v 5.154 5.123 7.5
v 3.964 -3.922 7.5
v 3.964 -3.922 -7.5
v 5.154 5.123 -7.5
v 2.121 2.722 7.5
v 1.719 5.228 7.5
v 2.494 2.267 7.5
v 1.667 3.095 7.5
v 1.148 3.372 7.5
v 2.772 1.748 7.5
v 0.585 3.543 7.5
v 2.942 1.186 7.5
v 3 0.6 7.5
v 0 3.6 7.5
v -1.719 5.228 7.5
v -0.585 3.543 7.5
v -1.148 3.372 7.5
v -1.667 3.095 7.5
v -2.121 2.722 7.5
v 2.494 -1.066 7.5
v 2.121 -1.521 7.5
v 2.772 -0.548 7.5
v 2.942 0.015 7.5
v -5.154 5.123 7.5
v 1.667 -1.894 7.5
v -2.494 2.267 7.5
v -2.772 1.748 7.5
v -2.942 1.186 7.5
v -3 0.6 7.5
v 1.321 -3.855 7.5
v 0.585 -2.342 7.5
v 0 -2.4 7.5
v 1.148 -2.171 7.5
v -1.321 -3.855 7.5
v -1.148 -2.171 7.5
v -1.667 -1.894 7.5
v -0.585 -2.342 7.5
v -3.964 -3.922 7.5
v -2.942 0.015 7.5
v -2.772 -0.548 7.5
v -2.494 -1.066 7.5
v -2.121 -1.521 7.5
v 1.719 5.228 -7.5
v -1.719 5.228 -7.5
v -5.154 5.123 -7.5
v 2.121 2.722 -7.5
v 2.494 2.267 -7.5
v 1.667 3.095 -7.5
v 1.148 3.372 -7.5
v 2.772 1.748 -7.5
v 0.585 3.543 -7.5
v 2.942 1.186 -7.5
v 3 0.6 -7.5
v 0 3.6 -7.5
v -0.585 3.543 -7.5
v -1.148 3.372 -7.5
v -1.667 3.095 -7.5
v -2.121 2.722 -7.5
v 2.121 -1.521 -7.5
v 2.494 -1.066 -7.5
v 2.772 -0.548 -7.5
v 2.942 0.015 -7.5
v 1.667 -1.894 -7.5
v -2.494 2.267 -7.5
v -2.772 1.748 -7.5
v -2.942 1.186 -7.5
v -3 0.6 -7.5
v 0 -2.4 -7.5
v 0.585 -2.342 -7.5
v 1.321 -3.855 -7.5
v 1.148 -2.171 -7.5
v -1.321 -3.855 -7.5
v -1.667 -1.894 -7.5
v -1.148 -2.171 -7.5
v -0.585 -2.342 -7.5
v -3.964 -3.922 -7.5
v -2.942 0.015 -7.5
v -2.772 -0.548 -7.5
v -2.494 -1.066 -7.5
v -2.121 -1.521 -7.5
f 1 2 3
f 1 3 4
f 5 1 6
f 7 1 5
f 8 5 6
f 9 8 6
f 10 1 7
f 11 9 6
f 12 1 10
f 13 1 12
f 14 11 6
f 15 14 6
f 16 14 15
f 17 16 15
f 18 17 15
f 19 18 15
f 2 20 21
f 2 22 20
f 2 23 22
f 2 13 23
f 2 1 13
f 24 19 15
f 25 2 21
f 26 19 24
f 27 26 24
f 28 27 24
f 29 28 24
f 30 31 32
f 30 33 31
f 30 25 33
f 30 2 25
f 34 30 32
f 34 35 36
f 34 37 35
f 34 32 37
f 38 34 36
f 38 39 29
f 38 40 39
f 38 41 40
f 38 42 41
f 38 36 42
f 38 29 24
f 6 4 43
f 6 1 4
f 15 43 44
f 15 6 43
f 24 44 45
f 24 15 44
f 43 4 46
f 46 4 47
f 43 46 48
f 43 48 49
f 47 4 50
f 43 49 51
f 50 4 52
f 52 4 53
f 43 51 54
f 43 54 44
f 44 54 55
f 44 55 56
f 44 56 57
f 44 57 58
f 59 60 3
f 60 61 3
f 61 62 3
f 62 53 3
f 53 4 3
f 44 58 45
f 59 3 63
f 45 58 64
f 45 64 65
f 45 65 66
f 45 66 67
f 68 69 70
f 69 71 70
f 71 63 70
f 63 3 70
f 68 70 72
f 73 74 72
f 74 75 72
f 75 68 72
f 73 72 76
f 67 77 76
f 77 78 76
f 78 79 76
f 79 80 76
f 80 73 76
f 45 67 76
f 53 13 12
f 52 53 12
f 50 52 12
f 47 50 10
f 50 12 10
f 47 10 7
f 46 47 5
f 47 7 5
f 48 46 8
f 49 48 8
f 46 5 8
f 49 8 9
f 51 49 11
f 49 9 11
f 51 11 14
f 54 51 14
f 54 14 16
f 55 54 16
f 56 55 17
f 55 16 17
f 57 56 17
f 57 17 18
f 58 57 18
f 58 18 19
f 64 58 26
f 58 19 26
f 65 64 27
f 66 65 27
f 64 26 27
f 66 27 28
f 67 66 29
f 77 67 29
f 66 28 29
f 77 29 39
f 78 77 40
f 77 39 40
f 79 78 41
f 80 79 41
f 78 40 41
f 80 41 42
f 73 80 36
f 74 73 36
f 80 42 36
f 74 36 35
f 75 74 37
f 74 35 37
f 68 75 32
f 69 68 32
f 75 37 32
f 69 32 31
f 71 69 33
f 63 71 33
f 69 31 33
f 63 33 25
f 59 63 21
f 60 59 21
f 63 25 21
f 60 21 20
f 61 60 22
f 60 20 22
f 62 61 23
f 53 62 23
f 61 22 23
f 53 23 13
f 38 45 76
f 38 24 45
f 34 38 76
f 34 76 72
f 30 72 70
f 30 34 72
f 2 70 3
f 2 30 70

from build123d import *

# Parameters (mm, degrees)
BOSS_EXTRUDE1_DEPTH = 7.5
SKETCH2_R           = 3
CUT_EXTRUDE1_DEPTH  = 15


with BuildPart() as part:
    # Sketch1 → Boss-Extrude1 (new, symmetric)
    with BuildSketch(Plane(origin=(0, 0, 0), x_dir=(-1, 0, 0), z_dir=(0, 0, 1))):
        with BuildLine():
            Line((5.154406377, -5.123005585), (3.963575151, 3.922255592))
            ThreePointArc((3.963575151, 3.922255592), (0, 3.846483961), (-3.963575151, 3.922255592))
            Line((-3.963575151, 3.922255592), (-5.154406377, -5.123005585))
            ThreePointArc((-5.154406377, -5.123005585), (0, -5.241098686), (5.154406377, -5.123005585))
        make_face()
    extrude(amount=BOSS_EXTRUDE1_DEPTH, both=True)

    # Sketch2 → Cut-Extrude1 (cut)
    with BuildSketch(Plane.XY.offset(7.5)):
        with Locations((0, 0.600374996)):
            Circle(SKETCH2_R)
    extrude(amount=-CUT_EXTRUDE1_DEPTH, mode=Mode.SUBTRACT)


solid = part.part
